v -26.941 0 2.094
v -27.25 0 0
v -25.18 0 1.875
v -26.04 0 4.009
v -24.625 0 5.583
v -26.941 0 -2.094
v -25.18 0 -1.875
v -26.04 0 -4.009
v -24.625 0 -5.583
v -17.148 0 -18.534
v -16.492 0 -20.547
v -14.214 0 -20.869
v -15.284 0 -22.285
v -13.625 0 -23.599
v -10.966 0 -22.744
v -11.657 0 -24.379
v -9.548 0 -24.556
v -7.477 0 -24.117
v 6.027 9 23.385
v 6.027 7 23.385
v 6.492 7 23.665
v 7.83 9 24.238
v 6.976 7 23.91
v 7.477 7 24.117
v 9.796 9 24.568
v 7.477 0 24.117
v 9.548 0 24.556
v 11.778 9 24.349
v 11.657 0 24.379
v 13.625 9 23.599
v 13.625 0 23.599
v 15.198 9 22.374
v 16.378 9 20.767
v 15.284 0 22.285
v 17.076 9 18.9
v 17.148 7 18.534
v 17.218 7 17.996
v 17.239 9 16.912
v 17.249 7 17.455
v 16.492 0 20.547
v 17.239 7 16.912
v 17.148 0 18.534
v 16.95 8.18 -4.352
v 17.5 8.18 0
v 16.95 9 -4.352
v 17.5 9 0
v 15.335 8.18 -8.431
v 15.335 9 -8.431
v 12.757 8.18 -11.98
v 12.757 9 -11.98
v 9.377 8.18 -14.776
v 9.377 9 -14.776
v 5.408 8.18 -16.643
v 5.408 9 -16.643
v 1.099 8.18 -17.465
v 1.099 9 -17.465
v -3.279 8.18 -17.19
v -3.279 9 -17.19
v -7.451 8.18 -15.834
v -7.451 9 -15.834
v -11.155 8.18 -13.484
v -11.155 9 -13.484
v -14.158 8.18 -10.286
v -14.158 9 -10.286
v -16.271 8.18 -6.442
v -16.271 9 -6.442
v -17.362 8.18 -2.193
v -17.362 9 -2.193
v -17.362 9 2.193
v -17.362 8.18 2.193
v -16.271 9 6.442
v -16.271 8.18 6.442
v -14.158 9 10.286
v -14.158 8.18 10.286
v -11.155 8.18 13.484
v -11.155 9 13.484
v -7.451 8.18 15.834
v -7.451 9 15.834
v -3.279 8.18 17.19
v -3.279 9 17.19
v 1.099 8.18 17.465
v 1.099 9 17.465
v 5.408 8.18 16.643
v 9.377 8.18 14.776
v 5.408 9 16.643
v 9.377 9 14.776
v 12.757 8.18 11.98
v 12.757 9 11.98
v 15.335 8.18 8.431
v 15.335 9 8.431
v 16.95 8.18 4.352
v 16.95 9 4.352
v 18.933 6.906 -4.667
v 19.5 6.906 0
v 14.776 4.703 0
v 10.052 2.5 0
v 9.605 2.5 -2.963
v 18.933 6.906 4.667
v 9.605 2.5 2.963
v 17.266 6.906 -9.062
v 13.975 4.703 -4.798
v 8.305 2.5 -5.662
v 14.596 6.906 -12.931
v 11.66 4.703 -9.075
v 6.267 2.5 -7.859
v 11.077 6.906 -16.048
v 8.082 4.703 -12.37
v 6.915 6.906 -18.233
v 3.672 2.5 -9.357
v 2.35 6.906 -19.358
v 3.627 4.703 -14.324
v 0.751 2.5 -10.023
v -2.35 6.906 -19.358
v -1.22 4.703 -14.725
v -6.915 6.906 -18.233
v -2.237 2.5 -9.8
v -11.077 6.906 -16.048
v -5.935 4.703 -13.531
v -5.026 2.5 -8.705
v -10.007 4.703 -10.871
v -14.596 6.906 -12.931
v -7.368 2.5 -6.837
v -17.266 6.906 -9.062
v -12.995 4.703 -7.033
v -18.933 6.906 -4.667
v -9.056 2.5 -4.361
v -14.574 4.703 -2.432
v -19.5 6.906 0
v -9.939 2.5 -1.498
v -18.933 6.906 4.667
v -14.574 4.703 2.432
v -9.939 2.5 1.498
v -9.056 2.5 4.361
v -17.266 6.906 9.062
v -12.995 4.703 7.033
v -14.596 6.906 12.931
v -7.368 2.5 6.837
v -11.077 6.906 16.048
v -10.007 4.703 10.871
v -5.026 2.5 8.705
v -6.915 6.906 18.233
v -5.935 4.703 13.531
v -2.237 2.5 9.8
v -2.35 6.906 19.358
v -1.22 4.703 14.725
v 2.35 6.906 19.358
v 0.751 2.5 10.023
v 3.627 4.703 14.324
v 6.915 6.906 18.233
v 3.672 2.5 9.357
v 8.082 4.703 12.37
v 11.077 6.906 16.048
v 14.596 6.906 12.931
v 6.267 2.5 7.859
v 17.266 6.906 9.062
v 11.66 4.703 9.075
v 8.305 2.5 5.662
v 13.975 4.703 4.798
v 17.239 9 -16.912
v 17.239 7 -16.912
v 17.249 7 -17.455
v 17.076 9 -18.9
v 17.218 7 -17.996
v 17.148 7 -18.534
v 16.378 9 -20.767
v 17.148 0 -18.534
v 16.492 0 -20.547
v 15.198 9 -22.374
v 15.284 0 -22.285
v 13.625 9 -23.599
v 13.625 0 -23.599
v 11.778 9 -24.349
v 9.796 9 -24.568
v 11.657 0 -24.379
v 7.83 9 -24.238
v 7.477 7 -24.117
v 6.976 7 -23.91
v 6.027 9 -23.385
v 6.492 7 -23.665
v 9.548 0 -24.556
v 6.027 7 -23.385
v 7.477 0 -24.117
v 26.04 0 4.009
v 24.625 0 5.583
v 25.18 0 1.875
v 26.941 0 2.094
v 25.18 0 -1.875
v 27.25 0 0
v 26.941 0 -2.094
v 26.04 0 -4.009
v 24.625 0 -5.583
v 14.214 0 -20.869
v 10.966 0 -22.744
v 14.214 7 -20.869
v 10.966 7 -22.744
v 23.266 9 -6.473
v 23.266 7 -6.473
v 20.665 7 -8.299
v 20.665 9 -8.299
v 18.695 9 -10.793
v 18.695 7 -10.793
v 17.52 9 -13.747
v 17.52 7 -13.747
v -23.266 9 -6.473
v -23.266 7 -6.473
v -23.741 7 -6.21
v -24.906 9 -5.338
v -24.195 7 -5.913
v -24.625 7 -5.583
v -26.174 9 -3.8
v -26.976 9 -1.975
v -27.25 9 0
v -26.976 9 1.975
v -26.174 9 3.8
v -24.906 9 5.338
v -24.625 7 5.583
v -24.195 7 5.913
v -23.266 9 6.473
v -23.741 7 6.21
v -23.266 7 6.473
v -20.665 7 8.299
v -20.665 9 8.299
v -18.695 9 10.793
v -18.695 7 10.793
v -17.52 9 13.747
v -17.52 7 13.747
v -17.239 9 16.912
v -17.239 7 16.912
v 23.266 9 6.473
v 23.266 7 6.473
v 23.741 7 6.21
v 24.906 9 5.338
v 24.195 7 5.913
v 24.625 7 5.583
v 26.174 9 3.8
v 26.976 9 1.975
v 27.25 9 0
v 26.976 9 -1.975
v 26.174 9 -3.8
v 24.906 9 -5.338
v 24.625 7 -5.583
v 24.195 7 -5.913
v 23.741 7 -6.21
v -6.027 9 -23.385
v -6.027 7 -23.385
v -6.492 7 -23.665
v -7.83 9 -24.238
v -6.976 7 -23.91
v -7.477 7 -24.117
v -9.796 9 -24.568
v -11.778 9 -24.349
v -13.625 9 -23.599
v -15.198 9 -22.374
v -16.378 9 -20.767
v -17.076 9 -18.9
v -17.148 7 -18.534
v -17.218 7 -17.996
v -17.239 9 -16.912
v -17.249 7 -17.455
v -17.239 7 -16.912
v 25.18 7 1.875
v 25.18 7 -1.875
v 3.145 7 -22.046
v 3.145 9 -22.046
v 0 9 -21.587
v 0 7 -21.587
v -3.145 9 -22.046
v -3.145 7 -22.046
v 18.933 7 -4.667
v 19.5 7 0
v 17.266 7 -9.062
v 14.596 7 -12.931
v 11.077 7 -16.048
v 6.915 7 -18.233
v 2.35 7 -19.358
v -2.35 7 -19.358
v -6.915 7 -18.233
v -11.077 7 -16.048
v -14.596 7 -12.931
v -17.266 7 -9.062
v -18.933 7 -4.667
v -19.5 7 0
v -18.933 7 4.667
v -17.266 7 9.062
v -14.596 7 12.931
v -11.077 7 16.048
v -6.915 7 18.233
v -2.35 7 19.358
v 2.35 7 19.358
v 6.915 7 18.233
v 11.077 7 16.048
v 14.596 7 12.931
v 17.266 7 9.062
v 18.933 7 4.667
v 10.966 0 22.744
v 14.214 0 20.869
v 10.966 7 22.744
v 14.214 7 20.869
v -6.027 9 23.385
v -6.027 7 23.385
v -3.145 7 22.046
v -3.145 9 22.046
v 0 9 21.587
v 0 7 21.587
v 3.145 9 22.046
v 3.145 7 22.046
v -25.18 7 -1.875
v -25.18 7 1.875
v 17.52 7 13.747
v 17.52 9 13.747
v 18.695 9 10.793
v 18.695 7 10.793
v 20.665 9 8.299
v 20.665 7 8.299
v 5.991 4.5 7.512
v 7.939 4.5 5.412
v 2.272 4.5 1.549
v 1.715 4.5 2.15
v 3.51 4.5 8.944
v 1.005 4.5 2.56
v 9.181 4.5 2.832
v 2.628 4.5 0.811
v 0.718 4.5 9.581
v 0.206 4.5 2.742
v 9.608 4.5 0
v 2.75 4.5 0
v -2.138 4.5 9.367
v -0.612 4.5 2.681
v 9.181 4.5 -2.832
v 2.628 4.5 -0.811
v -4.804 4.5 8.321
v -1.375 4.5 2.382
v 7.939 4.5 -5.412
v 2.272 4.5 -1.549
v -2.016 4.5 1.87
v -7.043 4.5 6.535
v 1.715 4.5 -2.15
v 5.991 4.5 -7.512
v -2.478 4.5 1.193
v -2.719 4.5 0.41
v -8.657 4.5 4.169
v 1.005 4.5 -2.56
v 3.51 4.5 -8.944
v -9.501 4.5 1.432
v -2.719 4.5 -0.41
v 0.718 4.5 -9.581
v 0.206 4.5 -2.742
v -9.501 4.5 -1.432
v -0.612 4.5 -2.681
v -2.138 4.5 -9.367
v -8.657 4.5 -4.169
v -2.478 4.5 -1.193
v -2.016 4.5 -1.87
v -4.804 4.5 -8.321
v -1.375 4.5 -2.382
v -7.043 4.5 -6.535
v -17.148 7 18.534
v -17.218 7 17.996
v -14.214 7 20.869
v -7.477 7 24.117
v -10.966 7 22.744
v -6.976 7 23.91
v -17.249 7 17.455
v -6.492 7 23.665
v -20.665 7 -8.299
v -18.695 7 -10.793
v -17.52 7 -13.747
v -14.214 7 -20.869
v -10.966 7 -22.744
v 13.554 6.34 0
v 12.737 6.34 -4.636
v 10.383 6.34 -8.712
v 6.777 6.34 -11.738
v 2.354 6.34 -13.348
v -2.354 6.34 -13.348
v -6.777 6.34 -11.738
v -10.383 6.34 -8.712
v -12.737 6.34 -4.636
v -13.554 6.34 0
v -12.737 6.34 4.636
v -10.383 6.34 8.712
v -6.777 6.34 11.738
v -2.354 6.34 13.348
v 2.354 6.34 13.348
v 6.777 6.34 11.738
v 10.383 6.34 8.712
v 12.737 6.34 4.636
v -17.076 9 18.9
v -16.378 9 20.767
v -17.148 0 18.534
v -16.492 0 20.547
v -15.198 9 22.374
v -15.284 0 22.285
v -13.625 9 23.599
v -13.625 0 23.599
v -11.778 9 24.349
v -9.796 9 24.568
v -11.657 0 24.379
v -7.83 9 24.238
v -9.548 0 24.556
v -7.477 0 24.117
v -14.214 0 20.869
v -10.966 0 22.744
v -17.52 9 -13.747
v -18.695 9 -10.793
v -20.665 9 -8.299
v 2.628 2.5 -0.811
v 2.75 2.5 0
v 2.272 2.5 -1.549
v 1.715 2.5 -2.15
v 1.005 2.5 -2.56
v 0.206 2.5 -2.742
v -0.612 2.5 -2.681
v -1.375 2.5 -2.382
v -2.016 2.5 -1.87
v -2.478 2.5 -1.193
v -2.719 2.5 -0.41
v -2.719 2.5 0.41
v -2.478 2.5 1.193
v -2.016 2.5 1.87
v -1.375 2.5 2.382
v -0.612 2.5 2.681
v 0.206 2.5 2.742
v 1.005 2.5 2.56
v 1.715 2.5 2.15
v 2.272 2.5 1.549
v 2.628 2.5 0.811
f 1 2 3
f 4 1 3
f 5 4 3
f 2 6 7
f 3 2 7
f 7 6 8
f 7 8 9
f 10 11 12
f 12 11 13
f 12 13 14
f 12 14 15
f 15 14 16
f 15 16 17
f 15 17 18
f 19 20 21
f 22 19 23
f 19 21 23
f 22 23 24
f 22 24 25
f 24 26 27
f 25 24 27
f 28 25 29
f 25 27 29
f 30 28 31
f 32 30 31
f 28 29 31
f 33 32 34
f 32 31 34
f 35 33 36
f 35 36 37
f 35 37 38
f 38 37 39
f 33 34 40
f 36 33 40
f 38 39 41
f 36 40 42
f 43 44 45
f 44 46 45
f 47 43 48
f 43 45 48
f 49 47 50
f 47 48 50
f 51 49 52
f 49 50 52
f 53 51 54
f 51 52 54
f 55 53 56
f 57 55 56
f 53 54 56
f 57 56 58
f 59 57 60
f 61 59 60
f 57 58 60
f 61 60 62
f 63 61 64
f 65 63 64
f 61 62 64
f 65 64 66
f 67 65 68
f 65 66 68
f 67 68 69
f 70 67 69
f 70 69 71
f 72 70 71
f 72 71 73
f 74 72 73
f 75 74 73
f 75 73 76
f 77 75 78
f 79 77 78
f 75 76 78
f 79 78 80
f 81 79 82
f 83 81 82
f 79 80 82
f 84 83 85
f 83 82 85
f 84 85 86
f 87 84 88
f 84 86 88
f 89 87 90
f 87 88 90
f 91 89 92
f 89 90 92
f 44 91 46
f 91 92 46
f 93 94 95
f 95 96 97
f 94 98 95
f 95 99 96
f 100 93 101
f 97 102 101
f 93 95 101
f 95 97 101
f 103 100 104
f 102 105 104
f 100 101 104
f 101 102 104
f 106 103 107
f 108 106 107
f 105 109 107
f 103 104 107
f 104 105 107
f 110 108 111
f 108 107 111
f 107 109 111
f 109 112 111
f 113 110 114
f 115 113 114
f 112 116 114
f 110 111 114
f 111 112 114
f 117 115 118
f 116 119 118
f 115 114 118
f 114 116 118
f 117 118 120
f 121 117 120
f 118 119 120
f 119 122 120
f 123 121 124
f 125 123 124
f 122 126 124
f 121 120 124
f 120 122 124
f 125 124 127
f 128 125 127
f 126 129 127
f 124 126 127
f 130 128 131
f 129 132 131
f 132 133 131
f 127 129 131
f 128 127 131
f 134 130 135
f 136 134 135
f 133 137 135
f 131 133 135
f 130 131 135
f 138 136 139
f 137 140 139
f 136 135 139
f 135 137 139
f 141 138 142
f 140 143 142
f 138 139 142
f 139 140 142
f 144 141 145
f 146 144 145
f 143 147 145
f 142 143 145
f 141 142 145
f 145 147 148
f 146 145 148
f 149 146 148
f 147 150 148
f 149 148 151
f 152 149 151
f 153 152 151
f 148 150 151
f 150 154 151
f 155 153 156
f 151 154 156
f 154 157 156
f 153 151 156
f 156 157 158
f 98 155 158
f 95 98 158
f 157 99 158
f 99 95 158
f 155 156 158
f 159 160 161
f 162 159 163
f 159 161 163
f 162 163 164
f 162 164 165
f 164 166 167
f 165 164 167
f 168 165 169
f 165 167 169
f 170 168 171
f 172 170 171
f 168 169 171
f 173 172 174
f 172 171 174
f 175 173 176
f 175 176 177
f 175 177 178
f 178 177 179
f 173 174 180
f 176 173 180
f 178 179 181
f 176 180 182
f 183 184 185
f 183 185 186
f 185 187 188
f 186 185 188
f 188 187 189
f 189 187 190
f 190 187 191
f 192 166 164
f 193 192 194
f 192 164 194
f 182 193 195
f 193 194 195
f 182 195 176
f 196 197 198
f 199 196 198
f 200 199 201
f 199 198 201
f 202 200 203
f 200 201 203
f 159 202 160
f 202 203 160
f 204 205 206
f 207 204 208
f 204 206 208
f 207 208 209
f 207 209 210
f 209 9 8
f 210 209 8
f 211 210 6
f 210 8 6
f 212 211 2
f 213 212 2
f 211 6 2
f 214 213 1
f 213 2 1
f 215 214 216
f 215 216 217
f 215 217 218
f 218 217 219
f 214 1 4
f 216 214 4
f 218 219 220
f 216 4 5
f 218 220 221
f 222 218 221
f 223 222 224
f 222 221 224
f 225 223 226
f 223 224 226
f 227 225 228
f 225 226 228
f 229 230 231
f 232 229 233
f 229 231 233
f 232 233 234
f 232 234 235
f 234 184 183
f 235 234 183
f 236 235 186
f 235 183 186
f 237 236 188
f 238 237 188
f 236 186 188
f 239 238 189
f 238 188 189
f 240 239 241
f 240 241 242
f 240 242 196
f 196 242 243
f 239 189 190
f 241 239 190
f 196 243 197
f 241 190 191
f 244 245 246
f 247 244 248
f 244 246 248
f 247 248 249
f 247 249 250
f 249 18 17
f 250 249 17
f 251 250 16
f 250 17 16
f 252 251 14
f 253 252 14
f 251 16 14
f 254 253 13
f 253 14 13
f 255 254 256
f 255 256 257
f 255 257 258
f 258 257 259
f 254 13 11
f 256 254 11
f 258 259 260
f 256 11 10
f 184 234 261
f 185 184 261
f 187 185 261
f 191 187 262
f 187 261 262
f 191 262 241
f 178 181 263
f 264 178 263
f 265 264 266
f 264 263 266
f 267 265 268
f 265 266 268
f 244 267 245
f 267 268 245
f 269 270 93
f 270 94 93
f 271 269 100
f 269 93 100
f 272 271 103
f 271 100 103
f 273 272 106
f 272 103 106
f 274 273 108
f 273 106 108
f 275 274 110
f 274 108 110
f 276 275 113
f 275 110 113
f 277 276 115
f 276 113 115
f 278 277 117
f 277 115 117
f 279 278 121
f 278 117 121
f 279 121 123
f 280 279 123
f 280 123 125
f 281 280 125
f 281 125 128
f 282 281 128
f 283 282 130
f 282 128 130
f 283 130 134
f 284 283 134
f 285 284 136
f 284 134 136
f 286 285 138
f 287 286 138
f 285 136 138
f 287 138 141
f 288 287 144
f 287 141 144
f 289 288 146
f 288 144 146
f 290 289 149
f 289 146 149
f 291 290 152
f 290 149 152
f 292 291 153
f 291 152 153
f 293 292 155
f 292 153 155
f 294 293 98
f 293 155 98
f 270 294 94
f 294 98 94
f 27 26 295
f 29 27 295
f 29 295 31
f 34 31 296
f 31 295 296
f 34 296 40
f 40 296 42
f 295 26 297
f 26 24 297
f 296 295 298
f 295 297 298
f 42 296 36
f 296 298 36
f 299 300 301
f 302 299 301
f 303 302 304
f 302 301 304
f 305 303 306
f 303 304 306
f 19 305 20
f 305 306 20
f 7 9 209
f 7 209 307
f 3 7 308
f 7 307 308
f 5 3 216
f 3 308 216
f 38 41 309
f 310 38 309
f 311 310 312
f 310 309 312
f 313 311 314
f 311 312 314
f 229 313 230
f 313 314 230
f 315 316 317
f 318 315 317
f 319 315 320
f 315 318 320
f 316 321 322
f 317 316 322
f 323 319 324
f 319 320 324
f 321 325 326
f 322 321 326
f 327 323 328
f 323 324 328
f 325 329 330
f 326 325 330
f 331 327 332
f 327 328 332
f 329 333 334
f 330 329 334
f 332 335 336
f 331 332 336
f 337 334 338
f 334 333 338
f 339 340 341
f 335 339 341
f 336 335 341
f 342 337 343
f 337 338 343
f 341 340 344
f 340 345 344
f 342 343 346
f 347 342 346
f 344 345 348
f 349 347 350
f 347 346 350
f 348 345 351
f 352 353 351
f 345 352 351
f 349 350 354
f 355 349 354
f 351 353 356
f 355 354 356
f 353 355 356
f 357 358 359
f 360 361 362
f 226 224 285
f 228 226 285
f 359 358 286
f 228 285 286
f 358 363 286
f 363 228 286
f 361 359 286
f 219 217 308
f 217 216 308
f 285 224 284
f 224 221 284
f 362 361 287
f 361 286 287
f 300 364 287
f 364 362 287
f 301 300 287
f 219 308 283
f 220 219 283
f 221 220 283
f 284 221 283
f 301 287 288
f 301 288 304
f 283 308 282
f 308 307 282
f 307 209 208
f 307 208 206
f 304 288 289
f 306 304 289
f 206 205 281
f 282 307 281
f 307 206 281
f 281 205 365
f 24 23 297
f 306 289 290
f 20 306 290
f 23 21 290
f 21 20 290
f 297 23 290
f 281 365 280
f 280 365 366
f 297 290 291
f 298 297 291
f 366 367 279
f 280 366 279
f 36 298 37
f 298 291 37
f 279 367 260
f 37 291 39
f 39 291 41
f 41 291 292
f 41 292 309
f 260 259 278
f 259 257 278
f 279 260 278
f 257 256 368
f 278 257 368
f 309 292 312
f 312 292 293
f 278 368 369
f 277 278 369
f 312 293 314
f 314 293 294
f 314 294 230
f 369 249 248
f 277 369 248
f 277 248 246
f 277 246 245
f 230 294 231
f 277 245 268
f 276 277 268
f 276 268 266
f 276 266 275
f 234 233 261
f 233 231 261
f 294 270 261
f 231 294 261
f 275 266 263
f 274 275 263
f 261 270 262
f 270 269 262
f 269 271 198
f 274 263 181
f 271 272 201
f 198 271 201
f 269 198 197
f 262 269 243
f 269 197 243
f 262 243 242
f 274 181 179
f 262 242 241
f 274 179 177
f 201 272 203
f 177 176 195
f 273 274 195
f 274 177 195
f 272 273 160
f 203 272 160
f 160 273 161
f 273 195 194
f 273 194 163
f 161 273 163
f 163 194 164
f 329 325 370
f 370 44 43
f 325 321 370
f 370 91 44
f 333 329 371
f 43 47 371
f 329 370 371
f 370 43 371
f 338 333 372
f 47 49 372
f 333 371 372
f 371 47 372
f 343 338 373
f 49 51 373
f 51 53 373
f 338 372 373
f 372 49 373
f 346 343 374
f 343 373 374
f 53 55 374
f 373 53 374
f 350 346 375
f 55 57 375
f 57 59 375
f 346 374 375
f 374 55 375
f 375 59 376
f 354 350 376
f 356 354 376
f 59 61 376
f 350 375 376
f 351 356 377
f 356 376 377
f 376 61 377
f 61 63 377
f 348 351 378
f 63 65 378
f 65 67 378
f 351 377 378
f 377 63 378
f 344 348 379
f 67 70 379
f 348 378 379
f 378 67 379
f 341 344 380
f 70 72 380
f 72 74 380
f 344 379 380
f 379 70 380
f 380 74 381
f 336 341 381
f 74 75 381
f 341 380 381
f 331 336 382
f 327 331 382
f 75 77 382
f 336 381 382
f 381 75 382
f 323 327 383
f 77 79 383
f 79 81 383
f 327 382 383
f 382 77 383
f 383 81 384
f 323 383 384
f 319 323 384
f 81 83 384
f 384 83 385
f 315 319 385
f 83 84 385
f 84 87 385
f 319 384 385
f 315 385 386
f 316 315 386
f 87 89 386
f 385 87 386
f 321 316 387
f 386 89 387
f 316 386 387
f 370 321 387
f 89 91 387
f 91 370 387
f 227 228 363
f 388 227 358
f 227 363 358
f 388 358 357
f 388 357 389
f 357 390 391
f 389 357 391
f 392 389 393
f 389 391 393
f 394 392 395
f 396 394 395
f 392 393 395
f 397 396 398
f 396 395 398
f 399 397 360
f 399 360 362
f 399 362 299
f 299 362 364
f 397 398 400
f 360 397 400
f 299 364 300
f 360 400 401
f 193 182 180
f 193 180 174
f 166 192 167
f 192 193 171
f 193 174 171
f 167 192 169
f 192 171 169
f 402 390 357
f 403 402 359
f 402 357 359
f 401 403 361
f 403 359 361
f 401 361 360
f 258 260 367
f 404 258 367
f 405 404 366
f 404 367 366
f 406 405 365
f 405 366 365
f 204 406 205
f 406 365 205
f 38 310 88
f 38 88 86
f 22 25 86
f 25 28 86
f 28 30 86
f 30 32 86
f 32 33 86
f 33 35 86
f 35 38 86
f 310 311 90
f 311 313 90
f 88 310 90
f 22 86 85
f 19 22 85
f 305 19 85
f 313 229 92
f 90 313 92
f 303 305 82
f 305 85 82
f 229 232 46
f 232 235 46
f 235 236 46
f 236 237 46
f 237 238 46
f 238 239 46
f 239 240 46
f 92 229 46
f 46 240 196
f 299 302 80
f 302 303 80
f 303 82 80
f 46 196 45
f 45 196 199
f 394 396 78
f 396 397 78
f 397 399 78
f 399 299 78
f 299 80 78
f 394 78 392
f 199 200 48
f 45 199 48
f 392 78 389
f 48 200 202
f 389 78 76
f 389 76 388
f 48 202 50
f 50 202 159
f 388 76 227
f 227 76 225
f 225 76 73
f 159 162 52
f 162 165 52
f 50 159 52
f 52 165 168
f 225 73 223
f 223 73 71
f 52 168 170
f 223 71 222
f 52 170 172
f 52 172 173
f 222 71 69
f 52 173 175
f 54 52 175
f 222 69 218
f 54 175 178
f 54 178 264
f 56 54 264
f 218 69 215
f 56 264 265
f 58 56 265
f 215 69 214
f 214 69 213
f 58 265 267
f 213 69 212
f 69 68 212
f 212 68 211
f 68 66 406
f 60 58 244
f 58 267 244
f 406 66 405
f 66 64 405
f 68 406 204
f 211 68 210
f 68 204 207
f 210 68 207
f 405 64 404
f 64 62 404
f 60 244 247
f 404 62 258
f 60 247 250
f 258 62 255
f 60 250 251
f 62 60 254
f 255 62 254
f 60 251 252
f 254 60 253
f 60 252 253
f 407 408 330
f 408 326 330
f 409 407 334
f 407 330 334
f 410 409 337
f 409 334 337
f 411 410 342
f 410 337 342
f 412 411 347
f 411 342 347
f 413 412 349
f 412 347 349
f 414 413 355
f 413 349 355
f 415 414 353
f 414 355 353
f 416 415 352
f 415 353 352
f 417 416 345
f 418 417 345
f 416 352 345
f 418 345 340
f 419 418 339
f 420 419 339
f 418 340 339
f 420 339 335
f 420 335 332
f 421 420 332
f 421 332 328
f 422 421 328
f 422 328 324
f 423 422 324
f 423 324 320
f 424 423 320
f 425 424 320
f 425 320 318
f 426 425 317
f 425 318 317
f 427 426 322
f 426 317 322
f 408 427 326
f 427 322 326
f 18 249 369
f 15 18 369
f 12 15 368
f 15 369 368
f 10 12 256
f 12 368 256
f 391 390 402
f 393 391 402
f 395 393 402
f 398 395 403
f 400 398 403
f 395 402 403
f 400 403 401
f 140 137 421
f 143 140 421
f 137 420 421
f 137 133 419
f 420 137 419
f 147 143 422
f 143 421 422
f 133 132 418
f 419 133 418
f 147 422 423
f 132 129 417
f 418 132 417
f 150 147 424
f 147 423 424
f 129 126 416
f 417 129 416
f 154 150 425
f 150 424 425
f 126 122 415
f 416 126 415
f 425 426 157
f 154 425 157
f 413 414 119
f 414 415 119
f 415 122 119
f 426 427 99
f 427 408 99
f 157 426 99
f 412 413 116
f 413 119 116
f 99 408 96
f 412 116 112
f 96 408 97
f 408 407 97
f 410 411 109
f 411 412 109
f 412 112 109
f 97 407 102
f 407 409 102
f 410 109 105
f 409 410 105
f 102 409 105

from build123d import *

# Parameters (mm, degrees)
SKETCH_7_OUTSIDE_W  = 72.02
SKETCH_7_OUTSIDE_H  = 72.02
CUT_EXTRUDE_3_DEPTH = 11


with BuildPart() as part:
    # 草图4 → 旋转-薄壁1 (revolve)
    with BuildSketch(Plane.XY):
        Polygon((2.75, 4.5), (9.608214533, 4.5), (17.5, 8.18), (17.5, 9), (27.25, 9), (27.25, 0), (25.25, 0), (25.25, 7), (19.5, 7), (19.5, 6.905859478), (10.051603858, 2.5), (2.75, 2.5), align=None)
    revolve(axis=Axis((0, 0, 0), (0, 1, 0)))

    # 草图7 outside → 切除-拉伸3 (cut)
    with BuildSketch(Plane(origin=(0, 0, 0), x_dir=(1, 0, 0), z_dir=(0, 1, 0))):
        Rectangle(SKETCH_7_OUTSIDE_W, SKETCH_7_OUTSIDE_H)
        with BuildLine():
            ThreePointArc((23.265907271, -6.472738964), (27.25, 0), (23.265907271, 6.472738964))
            ThreePointArc((23.265907271, 6.472738964), (18.694797481, 10.793446358), (17.23851001, 16.912497256))
            ThreePointArc((17.23851001, 16.912497256), (13.625, 23.599192253), (6.02739726, 23.385236221))
            ThreePointArc((6.02739726, 23.385236221), (0, 21.586892716), (-6.02739726, 23.385236221))
            ThreePointArc((-6.02739726, 23.385236221), (-13.625, 23.599192253), (-17.23851001, 16.912497256))
            ThreePointArc((-17.23851001, 16.912497256), (-18.694797481, 10.793446358), (-23.265907271, 6.472738964))
            ThreePointArc((-23.265907271, 6.472738964), (-27.25, 0), (-23.265907271, -6.472738964))
            ThreePointArc((-23.265907271, -6.472738964), (-18.694797481, -10.793446358), (-17.23851001, -16.912497256))
            ThreePointArc((-17.23851001, -16.912497256), (-13.625, -23.599192253), (-6.02739726, -23.385236221))
            ThreePointArc((-6.02739726, -23.385236221), (0, -21.586892716), (6.02739726, -23.385236221))
            ThreePointArc((6.02739726, -23.385236221), (13.625, -23.599192253), (17.23851001, -16.912497256))
            ThreePointArc((17.23851001, -16.912497256), (18.694797481, -10.793446358), (23.265907271, -6.472738964))
        make_face(mode=Mode.SUBTRACT)
    extrude(amount=CUT_EXTRUDE_3_DEPTH, mode=Mode.SUBTRACT)


solid = part.part
